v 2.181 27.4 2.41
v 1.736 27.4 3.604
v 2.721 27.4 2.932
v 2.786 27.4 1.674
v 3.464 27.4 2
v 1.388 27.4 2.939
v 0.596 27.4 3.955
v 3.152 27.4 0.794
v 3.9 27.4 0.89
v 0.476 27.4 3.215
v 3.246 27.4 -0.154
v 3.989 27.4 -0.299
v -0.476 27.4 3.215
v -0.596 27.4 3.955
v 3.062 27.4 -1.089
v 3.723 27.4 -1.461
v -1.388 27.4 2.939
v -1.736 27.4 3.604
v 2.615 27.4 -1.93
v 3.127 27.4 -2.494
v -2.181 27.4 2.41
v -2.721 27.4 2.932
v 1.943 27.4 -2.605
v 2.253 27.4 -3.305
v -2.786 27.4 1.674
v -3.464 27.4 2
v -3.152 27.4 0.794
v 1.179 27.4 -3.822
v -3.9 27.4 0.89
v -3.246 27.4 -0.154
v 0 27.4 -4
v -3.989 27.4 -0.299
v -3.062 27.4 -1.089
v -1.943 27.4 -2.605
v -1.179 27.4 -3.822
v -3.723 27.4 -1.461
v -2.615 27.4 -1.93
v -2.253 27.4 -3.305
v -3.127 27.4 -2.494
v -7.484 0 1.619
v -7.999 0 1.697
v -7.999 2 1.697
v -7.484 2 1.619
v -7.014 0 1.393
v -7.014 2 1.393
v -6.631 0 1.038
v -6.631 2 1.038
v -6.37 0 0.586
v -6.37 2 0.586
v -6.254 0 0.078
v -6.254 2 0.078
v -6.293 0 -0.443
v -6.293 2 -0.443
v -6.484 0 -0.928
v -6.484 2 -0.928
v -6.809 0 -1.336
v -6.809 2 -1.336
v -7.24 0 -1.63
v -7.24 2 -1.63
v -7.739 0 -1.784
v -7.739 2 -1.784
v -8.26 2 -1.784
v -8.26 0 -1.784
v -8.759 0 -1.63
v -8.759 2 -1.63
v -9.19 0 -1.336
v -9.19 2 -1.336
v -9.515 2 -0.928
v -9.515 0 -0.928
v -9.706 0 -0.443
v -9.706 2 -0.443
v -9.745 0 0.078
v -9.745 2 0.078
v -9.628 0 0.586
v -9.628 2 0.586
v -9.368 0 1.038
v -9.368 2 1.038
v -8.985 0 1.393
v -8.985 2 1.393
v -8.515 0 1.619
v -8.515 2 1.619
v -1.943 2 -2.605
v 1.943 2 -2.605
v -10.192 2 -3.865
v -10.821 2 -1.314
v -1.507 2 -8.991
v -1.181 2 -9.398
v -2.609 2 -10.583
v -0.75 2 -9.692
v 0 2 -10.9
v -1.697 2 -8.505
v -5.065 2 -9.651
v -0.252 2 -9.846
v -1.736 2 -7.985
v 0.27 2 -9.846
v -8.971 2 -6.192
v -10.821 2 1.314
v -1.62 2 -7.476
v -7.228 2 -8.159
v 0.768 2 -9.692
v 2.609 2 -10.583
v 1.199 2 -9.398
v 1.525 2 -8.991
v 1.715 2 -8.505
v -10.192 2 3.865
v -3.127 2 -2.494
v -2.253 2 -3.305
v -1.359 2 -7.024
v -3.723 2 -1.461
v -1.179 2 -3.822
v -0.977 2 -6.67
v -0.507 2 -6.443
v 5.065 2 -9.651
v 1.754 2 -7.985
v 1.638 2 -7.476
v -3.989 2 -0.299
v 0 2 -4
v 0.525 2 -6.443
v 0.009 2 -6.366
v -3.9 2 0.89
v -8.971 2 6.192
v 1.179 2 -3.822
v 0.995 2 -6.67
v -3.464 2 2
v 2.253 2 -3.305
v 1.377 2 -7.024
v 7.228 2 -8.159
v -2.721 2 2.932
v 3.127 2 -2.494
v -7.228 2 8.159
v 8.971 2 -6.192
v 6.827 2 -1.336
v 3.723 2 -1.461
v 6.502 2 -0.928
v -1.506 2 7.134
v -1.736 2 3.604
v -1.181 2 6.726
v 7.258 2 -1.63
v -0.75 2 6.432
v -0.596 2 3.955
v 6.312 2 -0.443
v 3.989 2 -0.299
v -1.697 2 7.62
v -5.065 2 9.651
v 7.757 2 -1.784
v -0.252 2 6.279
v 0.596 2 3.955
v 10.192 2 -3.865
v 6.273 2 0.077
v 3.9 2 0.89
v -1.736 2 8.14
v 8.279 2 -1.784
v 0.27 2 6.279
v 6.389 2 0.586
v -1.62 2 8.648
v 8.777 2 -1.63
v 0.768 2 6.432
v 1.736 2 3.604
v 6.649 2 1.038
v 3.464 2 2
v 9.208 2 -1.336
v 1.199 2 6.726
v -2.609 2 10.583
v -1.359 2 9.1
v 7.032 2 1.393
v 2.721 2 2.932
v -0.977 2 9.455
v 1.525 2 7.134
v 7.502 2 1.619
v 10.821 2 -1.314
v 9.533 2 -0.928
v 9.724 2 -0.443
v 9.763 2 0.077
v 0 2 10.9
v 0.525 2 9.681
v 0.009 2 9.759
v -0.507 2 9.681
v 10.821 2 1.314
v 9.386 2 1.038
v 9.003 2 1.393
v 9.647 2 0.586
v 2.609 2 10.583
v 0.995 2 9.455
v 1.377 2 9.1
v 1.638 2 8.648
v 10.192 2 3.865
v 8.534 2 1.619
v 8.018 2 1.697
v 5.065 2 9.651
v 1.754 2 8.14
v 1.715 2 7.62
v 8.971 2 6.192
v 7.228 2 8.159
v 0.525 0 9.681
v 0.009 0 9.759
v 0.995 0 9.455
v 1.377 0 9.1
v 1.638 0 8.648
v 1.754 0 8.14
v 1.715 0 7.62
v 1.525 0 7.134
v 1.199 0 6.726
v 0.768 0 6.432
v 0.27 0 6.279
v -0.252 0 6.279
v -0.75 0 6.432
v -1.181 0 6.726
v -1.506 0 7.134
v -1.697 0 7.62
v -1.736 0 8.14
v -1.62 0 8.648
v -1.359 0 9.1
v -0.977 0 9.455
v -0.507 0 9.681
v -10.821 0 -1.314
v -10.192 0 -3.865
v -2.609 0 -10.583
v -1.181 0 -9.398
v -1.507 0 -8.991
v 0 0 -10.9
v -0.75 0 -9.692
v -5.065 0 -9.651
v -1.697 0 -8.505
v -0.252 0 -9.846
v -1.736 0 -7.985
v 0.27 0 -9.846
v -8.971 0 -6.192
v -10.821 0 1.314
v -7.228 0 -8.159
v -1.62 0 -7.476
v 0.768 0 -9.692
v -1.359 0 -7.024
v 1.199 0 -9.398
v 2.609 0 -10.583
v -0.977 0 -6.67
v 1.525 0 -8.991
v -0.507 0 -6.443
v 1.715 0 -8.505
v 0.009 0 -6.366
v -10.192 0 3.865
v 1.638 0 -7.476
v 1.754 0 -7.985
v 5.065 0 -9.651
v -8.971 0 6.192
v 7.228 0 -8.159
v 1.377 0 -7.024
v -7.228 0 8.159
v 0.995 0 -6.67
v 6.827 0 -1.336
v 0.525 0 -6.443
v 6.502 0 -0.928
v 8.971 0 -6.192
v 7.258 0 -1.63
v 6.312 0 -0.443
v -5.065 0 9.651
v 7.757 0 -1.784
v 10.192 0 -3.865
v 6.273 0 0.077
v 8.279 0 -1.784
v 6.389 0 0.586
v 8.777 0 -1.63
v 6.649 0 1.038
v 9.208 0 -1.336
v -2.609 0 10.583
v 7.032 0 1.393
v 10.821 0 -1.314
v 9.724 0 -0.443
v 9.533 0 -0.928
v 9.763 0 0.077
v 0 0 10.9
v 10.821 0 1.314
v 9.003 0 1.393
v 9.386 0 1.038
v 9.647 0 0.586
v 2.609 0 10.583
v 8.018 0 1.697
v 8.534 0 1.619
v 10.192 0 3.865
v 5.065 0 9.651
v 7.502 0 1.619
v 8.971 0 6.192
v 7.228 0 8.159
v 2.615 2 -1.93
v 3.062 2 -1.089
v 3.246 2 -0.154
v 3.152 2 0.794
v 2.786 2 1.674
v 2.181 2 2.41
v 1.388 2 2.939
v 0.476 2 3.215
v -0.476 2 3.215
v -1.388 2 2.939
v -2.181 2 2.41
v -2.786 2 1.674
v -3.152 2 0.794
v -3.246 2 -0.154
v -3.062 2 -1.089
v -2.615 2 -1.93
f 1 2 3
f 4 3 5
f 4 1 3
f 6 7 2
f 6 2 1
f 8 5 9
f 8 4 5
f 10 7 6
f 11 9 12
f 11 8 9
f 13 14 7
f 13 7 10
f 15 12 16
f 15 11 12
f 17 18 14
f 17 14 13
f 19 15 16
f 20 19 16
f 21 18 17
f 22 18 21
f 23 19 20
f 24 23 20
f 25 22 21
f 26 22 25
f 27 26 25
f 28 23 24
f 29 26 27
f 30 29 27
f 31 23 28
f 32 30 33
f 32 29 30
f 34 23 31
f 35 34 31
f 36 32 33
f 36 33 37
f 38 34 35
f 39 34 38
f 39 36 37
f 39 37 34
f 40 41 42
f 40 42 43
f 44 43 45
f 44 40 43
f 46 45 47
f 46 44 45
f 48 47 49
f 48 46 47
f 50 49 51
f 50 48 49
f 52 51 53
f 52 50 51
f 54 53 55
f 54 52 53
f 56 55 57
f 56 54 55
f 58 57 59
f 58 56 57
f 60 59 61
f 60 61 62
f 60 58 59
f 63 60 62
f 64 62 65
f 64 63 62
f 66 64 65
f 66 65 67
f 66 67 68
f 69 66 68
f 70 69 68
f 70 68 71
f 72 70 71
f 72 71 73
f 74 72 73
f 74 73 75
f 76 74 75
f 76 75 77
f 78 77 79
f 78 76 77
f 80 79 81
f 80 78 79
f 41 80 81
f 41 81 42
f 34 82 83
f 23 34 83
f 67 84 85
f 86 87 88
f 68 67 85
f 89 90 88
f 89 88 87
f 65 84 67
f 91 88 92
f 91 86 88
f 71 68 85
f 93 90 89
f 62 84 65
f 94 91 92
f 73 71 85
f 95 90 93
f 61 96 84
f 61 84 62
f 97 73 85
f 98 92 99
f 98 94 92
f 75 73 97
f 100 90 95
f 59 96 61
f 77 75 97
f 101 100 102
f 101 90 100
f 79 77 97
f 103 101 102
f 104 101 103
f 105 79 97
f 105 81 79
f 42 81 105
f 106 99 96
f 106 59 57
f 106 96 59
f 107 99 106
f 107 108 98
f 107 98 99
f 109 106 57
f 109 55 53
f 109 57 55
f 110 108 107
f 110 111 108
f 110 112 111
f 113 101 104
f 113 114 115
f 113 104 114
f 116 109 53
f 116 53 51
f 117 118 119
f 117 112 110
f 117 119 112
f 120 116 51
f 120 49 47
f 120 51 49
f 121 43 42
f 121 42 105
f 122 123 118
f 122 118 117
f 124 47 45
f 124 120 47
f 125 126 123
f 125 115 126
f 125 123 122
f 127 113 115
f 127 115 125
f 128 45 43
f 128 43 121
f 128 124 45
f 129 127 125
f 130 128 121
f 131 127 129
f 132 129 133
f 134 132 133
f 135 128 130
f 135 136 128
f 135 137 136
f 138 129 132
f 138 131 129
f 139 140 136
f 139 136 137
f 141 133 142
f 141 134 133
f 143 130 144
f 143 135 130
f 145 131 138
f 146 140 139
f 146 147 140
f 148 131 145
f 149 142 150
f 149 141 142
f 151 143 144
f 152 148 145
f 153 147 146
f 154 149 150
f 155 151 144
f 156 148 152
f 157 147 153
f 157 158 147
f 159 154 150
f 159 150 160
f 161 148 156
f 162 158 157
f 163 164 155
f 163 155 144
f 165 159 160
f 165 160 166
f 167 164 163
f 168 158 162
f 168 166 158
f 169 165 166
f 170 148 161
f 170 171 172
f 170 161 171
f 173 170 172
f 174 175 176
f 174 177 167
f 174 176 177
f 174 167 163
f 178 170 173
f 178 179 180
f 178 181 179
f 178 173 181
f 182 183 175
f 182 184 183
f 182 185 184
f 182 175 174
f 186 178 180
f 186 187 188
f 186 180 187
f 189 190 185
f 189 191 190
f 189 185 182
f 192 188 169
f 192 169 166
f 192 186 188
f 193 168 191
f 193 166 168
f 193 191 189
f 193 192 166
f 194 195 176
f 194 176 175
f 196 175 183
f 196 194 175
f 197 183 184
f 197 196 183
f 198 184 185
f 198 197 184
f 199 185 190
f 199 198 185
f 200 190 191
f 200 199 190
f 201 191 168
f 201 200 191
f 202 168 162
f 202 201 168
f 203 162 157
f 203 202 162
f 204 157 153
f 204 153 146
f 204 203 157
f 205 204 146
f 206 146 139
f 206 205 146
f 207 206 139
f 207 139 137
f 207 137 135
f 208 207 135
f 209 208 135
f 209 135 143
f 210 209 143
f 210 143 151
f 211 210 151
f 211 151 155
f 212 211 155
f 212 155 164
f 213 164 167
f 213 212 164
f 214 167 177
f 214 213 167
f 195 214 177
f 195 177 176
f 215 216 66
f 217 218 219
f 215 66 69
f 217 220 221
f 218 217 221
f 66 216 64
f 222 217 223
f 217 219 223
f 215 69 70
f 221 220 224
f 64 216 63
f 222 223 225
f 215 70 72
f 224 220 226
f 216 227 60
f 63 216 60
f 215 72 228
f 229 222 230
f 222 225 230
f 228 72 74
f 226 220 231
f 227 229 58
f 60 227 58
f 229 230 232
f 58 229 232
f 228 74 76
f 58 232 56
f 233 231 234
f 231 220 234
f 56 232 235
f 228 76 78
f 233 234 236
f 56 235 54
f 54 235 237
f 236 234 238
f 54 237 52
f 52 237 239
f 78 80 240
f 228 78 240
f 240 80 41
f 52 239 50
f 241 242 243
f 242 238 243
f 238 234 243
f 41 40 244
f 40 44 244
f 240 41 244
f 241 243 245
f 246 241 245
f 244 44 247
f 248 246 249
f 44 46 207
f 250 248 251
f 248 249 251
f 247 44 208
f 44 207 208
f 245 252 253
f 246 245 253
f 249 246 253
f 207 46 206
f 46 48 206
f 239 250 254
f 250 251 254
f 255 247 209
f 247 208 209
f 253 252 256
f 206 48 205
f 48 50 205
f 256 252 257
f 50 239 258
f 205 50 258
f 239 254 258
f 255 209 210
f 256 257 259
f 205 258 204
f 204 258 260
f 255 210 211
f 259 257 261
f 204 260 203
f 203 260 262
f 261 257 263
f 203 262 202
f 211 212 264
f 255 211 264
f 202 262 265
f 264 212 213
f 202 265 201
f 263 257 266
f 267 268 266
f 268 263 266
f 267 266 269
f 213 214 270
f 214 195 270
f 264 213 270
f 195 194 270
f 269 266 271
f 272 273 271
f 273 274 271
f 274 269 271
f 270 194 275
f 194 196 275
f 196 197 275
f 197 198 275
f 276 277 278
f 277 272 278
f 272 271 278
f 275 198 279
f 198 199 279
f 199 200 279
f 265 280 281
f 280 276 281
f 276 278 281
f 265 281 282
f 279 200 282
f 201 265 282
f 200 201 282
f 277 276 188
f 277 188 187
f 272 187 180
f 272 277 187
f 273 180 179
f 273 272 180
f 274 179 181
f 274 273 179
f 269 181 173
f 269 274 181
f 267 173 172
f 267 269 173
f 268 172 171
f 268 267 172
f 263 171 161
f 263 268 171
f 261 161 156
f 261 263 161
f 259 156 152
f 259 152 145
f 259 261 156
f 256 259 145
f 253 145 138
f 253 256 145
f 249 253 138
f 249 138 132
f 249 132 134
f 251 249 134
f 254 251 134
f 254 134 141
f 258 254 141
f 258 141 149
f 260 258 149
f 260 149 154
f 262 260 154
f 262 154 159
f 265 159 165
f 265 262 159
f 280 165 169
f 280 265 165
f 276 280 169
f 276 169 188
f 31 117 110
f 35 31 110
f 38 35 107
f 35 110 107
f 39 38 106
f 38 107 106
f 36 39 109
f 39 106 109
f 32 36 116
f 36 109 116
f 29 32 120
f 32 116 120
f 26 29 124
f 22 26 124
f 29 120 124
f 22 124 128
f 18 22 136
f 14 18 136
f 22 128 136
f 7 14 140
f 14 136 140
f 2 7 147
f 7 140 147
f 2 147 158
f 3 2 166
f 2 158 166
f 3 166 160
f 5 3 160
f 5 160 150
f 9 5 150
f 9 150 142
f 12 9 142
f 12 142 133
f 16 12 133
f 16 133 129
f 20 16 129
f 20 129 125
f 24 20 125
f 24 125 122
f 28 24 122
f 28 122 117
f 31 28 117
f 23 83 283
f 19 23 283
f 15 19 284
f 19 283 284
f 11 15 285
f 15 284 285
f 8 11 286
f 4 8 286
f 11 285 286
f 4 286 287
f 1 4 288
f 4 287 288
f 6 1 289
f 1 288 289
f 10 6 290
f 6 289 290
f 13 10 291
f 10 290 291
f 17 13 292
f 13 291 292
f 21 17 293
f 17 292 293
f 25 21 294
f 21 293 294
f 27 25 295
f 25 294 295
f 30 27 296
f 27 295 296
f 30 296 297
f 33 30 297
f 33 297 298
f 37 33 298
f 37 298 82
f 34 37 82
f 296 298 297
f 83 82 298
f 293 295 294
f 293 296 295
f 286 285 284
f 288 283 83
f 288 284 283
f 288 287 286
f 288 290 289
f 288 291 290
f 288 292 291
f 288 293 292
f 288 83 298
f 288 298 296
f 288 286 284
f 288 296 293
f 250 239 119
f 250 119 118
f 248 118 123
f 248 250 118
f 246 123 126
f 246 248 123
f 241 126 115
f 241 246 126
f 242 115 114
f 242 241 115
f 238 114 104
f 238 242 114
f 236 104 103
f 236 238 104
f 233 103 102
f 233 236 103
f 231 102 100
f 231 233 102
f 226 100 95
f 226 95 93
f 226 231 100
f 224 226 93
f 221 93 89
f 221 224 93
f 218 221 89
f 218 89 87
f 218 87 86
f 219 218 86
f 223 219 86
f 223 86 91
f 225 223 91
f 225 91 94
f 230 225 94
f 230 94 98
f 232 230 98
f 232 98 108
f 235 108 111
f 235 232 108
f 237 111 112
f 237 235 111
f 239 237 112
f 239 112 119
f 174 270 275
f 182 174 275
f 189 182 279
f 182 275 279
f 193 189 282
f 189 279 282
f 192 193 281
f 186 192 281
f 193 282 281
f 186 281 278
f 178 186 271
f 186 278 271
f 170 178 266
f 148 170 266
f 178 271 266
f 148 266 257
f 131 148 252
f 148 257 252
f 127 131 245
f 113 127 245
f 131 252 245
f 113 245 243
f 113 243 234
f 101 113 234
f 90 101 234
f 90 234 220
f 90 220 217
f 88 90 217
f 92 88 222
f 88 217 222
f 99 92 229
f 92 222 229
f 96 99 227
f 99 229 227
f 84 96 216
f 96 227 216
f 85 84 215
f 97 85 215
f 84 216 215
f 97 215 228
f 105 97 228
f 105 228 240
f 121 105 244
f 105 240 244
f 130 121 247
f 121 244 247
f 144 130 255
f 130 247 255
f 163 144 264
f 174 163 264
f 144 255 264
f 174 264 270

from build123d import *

# Parameters (mm, degrees)
SKETCH3_R           = 4
BOSS_EXTRUDE1_DEPTH = 27.4
SKETCH3_17_R        = 10.9
SKETCH3_17_R_2      = 1.75
BOSS_EXTRUDE2_DEPTH = 2


with BuildPart() as part:
    # Sketch3 → Boss-Extrude1 (new body)
    with BuildSketch(Plane(origin=(0, 0, 0), x_dir=(1, 0, 0), z_dir=(0, 1, 0))):
        Circle(SKETCH3_R)
        with BuildLine():
            Line((-1.942645776, 2.605499451), (1.942645776, 2.605499451))
            ThreePointArc((1.942645776, 2.605499451), (0, -3.25), (-1.942645776, 2.605499451))
        make_face(mode=Mode.SUBTRACT)
    extrude(amount=BOSS_EXTRUDE1_DEPTH)

    # Sketch3<17> → Boss-Extrude2 (add)
    with BuildSketch(Plane(origin=(0, 0, 0), x_dir=(1, 0, 0), z_dir=(0, 1, 0))):
        Circle(SKETCH3_17_R)
        with Locations((0.009034474, 8.115584077)):
            Circle(SKETCH3_17_R_2, mode=Mode.SUBTRACT)
        with Locations((8.017679827, 0.053335715)):
            Circle(SKETCH3_17_R_2, mode=Mode.SUBTRACT)
        with Locations((0.009179949, -8.009057152)):
            Circle(SKETCH3_17_R_2, mode=Mode.SUBTRACT)
        with Locations((-7.999465404, 0.05319121)):
            Circle(SKETCH3_17_R_2, mode=Mode.SUBTRACT)
    extrude(amount=BOSS_EXTRUDE2_DEPTH)


solid = part.part
